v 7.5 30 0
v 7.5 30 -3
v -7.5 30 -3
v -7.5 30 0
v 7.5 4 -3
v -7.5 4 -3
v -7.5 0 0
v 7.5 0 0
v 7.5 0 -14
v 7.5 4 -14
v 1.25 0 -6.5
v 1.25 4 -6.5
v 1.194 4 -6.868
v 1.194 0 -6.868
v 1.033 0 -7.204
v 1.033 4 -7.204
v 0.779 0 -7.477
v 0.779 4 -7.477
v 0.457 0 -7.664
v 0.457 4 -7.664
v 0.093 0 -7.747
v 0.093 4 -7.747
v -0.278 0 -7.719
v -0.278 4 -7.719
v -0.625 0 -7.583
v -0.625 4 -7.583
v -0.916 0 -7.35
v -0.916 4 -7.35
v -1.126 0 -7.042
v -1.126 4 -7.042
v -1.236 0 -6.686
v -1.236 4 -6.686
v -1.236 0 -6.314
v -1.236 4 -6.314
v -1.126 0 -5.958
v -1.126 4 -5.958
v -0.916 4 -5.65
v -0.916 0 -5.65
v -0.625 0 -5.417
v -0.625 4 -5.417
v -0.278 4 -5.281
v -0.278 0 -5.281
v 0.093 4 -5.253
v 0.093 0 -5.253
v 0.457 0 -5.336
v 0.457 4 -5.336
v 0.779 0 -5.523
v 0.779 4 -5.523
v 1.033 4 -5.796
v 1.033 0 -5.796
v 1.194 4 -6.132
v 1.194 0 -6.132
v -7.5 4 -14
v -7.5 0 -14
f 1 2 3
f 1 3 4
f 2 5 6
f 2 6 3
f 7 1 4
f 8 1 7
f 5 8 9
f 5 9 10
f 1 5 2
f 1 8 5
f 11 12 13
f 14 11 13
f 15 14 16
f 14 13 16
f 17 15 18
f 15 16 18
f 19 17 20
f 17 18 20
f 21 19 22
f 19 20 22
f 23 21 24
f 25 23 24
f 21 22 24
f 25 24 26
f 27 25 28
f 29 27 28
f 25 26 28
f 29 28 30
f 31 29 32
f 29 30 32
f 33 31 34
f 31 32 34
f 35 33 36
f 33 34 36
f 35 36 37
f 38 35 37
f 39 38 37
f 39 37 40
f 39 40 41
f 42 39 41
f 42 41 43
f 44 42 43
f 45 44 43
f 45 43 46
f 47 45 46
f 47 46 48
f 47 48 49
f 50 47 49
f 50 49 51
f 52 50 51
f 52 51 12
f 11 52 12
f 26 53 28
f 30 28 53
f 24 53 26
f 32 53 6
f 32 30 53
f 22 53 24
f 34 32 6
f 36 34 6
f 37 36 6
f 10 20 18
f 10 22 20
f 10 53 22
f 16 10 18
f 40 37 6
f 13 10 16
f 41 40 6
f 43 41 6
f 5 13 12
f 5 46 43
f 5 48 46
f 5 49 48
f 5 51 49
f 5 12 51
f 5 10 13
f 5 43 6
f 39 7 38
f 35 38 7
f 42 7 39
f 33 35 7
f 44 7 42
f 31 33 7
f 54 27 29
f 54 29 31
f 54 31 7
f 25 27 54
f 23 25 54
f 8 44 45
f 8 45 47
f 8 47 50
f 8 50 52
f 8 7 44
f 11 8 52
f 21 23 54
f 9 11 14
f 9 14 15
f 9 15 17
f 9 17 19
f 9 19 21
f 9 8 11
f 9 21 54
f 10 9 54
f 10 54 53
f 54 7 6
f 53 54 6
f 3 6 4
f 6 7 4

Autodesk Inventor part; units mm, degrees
ref_plane "YZ Plane" through (0, 0, 0) normal (1, 0, 0) x (0, 1, 0)
ref_plane "XZ Plane" through (0, 0, 0) normal (0, 1, 0) x (-1, 0, 0)
ref_plane "XY Plane" through (0, 0, 0) normal (0, 0, 1) x (1, 0, 0)
sketch "Sketch1" plane through (0, 0, 0) normal (1, 0, 0) x (0, 1, 0)
  line L0 (30, 0) -> (0, 0)
  line L1 (0, 0) -> (0, -14)
  line L2 (0, -14) -> (4, -14)
  line L3 (4, -14) -> (4, -3)
  line L4 (4, -3) -> (30, -3)
  line L5 (30, -3) -> (30, 0)
  dimension "d0" = 4
  dimension "d1" = 14
  dimension "d2" = 3
  dimension "d3" = 30
extrude "Extrusion1" add sketch "Sketch1" against normal mid plane 15
sketch "Sketch2" plane through (-7.5, 4, -14) normal (0, 1, 0) x (1, 0, 0)
  circle A0 centre (7.5, -7.5) radius 1.25
  line L0 (0, 0) -> (15, 0) projected
  line L1 (0, -14) -> (15, -14) projected
  line L2 (0, -11) -> (15, -11) projected
  point P0 (7.5, -14)
  point P1 (7.5, -14)
  dimension "d6" = 2.5
  dimension "d10" = 3.5
extrude "Extrusion2" cut sketch "Sketch2" against normal through all
properties part number "battery_fix_board"
